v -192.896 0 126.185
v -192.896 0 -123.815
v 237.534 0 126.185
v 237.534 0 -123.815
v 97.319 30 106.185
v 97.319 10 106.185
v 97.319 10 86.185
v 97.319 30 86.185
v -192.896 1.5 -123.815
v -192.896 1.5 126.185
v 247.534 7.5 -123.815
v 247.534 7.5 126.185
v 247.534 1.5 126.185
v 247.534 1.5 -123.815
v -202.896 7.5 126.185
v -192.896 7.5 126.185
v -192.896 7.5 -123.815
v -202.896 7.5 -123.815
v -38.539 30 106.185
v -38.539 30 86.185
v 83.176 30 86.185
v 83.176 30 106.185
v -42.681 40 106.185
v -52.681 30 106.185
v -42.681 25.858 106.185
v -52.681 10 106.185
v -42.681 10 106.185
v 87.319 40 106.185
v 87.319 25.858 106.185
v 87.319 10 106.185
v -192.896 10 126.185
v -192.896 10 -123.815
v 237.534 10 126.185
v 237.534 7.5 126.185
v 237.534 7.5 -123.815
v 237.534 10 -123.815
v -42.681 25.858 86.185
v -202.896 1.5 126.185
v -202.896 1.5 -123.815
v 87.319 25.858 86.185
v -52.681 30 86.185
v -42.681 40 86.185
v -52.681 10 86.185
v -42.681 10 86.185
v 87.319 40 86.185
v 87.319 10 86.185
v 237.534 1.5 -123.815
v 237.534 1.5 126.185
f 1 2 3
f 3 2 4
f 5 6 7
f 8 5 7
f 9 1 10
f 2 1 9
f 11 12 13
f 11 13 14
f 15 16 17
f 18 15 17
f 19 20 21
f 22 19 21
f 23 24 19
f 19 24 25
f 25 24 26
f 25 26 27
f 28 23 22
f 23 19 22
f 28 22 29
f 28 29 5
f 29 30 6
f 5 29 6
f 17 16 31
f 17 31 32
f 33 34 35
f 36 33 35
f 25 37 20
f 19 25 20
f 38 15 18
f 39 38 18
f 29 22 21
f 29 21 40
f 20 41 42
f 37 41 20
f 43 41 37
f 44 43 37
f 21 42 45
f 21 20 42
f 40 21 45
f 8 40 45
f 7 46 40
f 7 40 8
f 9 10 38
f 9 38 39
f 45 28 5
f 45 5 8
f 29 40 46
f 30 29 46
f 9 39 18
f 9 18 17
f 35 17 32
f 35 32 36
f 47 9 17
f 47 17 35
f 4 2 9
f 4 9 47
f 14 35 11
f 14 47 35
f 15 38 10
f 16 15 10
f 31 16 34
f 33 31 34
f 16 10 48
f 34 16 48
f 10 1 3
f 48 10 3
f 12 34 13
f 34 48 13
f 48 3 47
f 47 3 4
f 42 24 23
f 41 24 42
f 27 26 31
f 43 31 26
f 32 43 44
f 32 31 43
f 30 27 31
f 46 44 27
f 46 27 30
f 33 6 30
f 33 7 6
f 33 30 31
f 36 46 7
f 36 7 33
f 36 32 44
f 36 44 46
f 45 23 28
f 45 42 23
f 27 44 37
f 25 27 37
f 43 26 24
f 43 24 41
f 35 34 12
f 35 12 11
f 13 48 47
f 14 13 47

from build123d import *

# Parameters (mm, degrees)
SKETCH_1_W          = 430.43
SKETCH_1_H          = 250
EXTRUDE_1_DEPTH     = 10
SKETCH_2_W          = 250
SKETCH_2_H          = 6
EXTRUDE_2_DEPTH     = 10
SKETCH_3_W          = 150
SKETCH_3_H          = 20
EXTRUDE_3_DEPTH     = 30
CHAMFER_2_SIZE      = 10
CHAMFER_3_SIZE      = 10
CUT_EXTRUDE_2_DEPTH = 30


with BuildPart() as part:
    # 草图1 → 凸台-拉伸1 (new body)
    with BuildSketch(Plane(origin=(0, 0, 0), x_dir=(1, 0, 0), z_dir=(0, 1, 0))):
        with Locations((22.318592593, -1.184950617)):
            Rectangle(SKETCH_1_W, SKETCH_1_H)
    extrude(amount=EXTRUDE_1_DEPTH)

    # 草图2 → 凸台-拉伸2 (add)
    with BuildSketch(Plane(origin=(237.533592593, 0, 0), x_dir=(0, 0, -1), z_dir=(1, 0, 0))):
        with Locations((-1.184950617, 4.5)):
            Rectangle(SKETCH_2_W, SKETCH_2_H)
    extrude_2 = extrude(amount=EXTRUDE_2_DEPTH)

    # 镜向1: 凸台-拉伸2 across plane
    add(extrude_2.mirror(Plane(origin=(22.318592593, 0, 0), x_dir=(0, 0, 1), z_dir=(1, 0, 0))))

    # 草图3 → 凸台-拉伸3 (add)
    with BuildSketch(Plane(origin=(0, 10, 0), x_dir=(1, 0, 0), z_dir=(0, 1, 0))):
        with Locations((22.318592593, -96.184950617)):
            Rectangle(SKETCH_3_W, SKETCH_3_H)
    extrude(amount=EXTRUDE_3_DEPTH)

    # 倒角2
    chamfer_2_edges = [part.edges().sort_by_distance(p)[0] for p in [
        (97.318592593, 40, 96.184950617),
    ]]
    chamfer(chamfer_2_edges, length=CHAMFER_2_SIZE)

    # 倒角3
    chamfer_3_edges = [part.edges().sort_by_distance(p)[0] for p in [
        (-52.681407407, 40, 96.184950617),
    ]]
    chamfer(chamfer_3_edges, length=CHAMFER_3_SIZE)

    # 草图5 → 切除-拉伸2 (cut)
    with BuildSketch(Plane(origin=(0, 0, 86.184950617), x_dir=(-1, 0, 0), z_dir=(0, 0, -1))):
        Polygon((-87.318592593, 20), (-87.318592593, 10), (42.681407407, 10), (42.681407407, 20), (42.681407407, 25.857864376), (38.539271784, 30), (-83.176456969, 30), (-87.318592593, 25.857864376), align=None)
    extrude(amount=-CUT_EXTRUDE_2_DEPTH, mode=Mode.SUBTRACT)


solid = part.part
